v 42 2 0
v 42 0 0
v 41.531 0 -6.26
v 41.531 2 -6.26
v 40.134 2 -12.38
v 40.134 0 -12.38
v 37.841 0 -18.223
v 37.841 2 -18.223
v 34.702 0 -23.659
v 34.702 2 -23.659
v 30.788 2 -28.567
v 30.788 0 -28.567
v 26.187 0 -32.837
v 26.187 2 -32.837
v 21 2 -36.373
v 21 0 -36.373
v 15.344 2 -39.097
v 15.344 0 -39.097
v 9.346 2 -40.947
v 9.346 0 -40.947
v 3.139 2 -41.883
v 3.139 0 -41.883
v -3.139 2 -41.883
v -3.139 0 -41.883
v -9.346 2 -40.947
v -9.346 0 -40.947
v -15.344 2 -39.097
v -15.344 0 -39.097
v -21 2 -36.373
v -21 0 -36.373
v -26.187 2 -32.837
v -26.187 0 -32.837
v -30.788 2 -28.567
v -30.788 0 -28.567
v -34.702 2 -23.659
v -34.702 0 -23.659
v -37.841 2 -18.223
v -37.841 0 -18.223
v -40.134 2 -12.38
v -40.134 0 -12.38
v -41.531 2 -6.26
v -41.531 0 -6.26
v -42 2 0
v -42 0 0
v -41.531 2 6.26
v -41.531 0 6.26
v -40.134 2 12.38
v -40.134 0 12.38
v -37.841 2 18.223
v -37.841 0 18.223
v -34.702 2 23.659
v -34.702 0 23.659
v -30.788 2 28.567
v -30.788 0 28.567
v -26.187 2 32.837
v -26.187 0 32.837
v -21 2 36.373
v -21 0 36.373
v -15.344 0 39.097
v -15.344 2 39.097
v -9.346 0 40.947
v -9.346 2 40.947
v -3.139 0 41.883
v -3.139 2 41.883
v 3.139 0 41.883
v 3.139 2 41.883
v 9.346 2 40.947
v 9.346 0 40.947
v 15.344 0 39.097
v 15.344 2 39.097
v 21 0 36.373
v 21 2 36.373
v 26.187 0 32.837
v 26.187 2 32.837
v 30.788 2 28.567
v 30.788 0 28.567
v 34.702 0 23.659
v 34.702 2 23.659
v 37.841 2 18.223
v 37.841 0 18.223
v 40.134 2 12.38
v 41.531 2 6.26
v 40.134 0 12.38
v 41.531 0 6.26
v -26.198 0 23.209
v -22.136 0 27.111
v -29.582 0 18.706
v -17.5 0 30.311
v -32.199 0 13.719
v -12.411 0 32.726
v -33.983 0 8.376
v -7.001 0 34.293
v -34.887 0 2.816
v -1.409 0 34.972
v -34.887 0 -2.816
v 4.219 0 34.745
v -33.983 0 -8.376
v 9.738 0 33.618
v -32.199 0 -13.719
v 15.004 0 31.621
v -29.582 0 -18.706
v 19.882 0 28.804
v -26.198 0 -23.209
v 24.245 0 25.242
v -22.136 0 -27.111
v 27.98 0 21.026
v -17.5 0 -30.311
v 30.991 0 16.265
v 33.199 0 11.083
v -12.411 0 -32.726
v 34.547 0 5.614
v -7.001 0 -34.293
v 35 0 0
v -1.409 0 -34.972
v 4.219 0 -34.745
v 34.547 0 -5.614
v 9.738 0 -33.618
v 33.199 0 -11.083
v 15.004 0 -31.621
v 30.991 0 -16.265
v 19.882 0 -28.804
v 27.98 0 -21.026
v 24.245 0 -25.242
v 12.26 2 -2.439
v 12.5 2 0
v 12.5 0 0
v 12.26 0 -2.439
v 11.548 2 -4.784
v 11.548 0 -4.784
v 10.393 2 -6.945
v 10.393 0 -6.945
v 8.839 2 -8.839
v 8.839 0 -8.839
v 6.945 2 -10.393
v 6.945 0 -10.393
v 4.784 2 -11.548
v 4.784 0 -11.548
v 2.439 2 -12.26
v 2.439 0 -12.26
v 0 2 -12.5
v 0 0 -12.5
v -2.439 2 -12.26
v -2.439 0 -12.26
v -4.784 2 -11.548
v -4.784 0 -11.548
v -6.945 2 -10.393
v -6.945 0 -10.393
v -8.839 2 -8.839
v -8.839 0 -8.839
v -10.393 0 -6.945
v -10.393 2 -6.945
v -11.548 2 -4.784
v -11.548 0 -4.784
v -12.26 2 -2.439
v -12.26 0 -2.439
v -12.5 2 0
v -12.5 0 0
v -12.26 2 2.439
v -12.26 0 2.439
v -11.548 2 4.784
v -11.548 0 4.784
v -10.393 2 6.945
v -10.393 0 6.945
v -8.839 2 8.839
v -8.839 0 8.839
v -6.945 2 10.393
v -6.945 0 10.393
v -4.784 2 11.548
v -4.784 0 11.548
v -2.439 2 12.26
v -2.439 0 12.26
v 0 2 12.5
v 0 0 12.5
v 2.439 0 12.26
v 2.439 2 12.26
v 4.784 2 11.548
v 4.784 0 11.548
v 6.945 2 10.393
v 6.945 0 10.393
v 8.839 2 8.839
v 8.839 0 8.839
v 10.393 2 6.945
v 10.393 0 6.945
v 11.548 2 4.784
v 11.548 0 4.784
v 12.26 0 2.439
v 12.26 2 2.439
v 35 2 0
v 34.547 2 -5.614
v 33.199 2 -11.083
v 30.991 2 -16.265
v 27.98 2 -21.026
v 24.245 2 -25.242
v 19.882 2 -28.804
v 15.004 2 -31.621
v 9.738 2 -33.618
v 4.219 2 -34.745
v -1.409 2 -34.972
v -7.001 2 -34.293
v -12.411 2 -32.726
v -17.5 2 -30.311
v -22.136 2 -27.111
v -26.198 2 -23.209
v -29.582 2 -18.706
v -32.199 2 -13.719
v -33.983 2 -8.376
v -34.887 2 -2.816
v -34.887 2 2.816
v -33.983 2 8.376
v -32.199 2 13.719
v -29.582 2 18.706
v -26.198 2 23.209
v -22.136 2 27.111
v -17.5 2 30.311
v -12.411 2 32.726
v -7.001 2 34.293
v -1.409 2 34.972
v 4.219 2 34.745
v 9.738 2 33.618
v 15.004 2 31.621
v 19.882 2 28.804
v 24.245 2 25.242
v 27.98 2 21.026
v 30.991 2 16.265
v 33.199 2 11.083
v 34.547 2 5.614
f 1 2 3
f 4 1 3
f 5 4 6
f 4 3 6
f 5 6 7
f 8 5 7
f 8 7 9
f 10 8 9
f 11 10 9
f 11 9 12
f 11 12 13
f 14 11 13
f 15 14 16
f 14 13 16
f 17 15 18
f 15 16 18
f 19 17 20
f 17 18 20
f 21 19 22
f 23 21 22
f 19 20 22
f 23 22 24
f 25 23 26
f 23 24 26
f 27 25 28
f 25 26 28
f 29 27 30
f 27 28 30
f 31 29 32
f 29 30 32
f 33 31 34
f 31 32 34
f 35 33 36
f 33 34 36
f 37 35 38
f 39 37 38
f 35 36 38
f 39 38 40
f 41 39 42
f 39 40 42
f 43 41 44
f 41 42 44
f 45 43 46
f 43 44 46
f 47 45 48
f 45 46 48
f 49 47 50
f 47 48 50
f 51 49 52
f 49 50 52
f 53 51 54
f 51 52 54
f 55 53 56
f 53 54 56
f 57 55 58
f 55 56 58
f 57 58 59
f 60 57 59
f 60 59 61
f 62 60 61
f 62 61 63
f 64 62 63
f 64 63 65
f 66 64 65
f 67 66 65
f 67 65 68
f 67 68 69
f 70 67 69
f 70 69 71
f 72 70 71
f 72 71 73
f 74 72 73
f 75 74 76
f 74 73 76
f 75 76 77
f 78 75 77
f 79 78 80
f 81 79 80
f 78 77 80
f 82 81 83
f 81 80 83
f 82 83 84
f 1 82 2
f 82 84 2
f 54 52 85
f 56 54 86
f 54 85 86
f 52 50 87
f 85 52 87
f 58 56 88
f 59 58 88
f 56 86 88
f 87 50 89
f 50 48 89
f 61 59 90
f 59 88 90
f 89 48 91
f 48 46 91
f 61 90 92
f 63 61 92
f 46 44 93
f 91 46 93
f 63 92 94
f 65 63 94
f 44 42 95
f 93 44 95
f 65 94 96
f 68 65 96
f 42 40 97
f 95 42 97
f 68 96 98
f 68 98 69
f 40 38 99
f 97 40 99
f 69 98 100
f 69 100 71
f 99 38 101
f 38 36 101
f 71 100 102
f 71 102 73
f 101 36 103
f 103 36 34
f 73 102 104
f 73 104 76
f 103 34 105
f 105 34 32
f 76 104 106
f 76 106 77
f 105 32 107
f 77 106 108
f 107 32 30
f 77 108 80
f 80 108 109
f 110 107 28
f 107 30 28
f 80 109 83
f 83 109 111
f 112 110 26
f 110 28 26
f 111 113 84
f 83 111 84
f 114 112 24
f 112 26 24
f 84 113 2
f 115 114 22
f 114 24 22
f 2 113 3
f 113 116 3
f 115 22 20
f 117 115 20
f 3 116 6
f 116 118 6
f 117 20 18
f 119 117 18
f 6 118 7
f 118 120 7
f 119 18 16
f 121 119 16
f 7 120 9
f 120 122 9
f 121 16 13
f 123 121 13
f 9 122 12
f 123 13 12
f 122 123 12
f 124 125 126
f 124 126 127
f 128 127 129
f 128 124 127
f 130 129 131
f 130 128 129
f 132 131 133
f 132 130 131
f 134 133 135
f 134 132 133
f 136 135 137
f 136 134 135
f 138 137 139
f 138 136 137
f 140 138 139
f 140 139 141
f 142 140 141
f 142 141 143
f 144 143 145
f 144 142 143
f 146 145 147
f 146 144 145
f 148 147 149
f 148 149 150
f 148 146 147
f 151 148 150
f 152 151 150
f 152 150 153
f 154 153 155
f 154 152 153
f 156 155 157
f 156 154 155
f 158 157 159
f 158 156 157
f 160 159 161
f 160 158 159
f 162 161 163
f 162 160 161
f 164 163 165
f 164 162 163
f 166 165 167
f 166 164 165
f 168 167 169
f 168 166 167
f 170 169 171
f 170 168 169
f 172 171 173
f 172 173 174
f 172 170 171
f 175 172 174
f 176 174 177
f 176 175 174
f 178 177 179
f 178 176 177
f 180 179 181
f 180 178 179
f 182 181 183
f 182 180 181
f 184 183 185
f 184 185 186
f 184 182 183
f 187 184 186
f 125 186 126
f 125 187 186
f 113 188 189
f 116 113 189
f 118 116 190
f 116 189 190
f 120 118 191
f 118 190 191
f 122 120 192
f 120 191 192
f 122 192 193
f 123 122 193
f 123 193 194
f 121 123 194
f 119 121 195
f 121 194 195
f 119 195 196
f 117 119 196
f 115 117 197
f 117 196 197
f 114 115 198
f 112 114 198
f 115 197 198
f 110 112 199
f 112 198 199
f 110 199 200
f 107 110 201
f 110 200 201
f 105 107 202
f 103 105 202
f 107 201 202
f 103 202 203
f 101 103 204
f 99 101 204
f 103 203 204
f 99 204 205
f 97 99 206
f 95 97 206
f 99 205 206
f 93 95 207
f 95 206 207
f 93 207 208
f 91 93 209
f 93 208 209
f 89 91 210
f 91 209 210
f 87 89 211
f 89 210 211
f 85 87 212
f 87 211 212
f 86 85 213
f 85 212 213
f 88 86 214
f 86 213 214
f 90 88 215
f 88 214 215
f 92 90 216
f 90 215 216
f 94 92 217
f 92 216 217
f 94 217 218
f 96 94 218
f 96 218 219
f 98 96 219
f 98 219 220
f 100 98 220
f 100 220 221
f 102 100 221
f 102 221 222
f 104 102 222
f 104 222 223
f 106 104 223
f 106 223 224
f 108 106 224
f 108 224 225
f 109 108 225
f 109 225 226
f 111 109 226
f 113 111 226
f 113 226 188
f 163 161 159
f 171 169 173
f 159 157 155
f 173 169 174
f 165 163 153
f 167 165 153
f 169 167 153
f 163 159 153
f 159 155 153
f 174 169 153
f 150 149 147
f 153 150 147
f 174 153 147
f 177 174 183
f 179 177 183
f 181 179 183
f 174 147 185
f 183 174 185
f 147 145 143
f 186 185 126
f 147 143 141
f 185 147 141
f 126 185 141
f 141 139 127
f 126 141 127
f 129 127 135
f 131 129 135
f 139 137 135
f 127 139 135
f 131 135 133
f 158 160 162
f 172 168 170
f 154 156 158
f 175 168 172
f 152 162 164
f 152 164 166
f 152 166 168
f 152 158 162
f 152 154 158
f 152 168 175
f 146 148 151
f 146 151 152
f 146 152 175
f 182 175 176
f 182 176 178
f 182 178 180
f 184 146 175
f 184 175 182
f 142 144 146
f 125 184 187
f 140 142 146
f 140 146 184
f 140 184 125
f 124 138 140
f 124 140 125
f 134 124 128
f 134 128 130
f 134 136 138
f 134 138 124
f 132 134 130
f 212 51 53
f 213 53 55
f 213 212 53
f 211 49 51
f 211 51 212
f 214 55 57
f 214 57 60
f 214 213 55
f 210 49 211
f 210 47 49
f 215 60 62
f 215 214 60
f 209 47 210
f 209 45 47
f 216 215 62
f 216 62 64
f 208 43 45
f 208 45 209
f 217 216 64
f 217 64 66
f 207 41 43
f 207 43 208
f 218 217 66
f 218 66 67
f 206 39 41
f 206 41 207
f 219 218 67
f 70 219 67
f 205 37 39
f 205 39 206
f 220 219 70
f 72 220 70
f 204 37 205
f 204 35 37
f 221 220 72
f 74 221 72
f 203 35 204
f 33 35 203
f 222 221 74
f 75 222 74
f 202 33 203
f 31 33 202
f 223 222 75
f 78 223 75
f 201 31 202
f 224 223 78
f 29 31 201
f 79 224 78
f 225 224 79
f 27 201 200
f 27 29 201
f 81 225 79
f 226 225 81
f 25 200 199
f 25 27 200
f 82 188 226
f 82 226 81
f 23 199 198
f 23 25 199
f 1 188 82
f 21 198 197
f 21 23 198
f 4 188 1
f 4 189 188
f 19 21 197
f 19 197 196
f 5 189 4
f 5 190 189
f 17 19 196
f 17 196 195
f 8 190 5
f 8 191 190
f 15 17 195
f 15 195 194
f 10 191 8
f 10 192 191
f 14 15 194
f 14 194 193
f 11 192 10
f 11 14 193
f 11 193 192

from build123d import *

# Parameters (mm, degrees)
SKETCH1_R           = 42
BOSS_EXTRUDE1_DEPTH = 2
SKETCH2_R           = 35
SKETCH2_R_2         = 12.5
CUT_EXTRUDE1_DEPTH  = 2


with BuildPart() as part:
    # Sketch1 → Boss-Extrude1 (new body)
    with BuildSketch(Plane(origin=(0, 0, 0), x_dir=(1, 0, 0), z_dir=(0, 1, 0))):
        Circle(SKETCH1_R)
    extrude(amount=BOSS_EXTRUDE1_DEPTH)

    # Sketch2 → Cut-Extrude1 (cut)
    with BuildSketch(Plane(origin=(0, 2, 0), x_dir=(1, 0, 0), z_dir=(0, 1, 0))):
        Circle(SKETCH2_R)
        Circle(SKETCH2_R_2, mode=Mode.SUBTRACT)
    extrude(amount=-CUT_EXTRUDE1_DEPTH, mode=Mode.SUBTRACT)


solid = part.part
